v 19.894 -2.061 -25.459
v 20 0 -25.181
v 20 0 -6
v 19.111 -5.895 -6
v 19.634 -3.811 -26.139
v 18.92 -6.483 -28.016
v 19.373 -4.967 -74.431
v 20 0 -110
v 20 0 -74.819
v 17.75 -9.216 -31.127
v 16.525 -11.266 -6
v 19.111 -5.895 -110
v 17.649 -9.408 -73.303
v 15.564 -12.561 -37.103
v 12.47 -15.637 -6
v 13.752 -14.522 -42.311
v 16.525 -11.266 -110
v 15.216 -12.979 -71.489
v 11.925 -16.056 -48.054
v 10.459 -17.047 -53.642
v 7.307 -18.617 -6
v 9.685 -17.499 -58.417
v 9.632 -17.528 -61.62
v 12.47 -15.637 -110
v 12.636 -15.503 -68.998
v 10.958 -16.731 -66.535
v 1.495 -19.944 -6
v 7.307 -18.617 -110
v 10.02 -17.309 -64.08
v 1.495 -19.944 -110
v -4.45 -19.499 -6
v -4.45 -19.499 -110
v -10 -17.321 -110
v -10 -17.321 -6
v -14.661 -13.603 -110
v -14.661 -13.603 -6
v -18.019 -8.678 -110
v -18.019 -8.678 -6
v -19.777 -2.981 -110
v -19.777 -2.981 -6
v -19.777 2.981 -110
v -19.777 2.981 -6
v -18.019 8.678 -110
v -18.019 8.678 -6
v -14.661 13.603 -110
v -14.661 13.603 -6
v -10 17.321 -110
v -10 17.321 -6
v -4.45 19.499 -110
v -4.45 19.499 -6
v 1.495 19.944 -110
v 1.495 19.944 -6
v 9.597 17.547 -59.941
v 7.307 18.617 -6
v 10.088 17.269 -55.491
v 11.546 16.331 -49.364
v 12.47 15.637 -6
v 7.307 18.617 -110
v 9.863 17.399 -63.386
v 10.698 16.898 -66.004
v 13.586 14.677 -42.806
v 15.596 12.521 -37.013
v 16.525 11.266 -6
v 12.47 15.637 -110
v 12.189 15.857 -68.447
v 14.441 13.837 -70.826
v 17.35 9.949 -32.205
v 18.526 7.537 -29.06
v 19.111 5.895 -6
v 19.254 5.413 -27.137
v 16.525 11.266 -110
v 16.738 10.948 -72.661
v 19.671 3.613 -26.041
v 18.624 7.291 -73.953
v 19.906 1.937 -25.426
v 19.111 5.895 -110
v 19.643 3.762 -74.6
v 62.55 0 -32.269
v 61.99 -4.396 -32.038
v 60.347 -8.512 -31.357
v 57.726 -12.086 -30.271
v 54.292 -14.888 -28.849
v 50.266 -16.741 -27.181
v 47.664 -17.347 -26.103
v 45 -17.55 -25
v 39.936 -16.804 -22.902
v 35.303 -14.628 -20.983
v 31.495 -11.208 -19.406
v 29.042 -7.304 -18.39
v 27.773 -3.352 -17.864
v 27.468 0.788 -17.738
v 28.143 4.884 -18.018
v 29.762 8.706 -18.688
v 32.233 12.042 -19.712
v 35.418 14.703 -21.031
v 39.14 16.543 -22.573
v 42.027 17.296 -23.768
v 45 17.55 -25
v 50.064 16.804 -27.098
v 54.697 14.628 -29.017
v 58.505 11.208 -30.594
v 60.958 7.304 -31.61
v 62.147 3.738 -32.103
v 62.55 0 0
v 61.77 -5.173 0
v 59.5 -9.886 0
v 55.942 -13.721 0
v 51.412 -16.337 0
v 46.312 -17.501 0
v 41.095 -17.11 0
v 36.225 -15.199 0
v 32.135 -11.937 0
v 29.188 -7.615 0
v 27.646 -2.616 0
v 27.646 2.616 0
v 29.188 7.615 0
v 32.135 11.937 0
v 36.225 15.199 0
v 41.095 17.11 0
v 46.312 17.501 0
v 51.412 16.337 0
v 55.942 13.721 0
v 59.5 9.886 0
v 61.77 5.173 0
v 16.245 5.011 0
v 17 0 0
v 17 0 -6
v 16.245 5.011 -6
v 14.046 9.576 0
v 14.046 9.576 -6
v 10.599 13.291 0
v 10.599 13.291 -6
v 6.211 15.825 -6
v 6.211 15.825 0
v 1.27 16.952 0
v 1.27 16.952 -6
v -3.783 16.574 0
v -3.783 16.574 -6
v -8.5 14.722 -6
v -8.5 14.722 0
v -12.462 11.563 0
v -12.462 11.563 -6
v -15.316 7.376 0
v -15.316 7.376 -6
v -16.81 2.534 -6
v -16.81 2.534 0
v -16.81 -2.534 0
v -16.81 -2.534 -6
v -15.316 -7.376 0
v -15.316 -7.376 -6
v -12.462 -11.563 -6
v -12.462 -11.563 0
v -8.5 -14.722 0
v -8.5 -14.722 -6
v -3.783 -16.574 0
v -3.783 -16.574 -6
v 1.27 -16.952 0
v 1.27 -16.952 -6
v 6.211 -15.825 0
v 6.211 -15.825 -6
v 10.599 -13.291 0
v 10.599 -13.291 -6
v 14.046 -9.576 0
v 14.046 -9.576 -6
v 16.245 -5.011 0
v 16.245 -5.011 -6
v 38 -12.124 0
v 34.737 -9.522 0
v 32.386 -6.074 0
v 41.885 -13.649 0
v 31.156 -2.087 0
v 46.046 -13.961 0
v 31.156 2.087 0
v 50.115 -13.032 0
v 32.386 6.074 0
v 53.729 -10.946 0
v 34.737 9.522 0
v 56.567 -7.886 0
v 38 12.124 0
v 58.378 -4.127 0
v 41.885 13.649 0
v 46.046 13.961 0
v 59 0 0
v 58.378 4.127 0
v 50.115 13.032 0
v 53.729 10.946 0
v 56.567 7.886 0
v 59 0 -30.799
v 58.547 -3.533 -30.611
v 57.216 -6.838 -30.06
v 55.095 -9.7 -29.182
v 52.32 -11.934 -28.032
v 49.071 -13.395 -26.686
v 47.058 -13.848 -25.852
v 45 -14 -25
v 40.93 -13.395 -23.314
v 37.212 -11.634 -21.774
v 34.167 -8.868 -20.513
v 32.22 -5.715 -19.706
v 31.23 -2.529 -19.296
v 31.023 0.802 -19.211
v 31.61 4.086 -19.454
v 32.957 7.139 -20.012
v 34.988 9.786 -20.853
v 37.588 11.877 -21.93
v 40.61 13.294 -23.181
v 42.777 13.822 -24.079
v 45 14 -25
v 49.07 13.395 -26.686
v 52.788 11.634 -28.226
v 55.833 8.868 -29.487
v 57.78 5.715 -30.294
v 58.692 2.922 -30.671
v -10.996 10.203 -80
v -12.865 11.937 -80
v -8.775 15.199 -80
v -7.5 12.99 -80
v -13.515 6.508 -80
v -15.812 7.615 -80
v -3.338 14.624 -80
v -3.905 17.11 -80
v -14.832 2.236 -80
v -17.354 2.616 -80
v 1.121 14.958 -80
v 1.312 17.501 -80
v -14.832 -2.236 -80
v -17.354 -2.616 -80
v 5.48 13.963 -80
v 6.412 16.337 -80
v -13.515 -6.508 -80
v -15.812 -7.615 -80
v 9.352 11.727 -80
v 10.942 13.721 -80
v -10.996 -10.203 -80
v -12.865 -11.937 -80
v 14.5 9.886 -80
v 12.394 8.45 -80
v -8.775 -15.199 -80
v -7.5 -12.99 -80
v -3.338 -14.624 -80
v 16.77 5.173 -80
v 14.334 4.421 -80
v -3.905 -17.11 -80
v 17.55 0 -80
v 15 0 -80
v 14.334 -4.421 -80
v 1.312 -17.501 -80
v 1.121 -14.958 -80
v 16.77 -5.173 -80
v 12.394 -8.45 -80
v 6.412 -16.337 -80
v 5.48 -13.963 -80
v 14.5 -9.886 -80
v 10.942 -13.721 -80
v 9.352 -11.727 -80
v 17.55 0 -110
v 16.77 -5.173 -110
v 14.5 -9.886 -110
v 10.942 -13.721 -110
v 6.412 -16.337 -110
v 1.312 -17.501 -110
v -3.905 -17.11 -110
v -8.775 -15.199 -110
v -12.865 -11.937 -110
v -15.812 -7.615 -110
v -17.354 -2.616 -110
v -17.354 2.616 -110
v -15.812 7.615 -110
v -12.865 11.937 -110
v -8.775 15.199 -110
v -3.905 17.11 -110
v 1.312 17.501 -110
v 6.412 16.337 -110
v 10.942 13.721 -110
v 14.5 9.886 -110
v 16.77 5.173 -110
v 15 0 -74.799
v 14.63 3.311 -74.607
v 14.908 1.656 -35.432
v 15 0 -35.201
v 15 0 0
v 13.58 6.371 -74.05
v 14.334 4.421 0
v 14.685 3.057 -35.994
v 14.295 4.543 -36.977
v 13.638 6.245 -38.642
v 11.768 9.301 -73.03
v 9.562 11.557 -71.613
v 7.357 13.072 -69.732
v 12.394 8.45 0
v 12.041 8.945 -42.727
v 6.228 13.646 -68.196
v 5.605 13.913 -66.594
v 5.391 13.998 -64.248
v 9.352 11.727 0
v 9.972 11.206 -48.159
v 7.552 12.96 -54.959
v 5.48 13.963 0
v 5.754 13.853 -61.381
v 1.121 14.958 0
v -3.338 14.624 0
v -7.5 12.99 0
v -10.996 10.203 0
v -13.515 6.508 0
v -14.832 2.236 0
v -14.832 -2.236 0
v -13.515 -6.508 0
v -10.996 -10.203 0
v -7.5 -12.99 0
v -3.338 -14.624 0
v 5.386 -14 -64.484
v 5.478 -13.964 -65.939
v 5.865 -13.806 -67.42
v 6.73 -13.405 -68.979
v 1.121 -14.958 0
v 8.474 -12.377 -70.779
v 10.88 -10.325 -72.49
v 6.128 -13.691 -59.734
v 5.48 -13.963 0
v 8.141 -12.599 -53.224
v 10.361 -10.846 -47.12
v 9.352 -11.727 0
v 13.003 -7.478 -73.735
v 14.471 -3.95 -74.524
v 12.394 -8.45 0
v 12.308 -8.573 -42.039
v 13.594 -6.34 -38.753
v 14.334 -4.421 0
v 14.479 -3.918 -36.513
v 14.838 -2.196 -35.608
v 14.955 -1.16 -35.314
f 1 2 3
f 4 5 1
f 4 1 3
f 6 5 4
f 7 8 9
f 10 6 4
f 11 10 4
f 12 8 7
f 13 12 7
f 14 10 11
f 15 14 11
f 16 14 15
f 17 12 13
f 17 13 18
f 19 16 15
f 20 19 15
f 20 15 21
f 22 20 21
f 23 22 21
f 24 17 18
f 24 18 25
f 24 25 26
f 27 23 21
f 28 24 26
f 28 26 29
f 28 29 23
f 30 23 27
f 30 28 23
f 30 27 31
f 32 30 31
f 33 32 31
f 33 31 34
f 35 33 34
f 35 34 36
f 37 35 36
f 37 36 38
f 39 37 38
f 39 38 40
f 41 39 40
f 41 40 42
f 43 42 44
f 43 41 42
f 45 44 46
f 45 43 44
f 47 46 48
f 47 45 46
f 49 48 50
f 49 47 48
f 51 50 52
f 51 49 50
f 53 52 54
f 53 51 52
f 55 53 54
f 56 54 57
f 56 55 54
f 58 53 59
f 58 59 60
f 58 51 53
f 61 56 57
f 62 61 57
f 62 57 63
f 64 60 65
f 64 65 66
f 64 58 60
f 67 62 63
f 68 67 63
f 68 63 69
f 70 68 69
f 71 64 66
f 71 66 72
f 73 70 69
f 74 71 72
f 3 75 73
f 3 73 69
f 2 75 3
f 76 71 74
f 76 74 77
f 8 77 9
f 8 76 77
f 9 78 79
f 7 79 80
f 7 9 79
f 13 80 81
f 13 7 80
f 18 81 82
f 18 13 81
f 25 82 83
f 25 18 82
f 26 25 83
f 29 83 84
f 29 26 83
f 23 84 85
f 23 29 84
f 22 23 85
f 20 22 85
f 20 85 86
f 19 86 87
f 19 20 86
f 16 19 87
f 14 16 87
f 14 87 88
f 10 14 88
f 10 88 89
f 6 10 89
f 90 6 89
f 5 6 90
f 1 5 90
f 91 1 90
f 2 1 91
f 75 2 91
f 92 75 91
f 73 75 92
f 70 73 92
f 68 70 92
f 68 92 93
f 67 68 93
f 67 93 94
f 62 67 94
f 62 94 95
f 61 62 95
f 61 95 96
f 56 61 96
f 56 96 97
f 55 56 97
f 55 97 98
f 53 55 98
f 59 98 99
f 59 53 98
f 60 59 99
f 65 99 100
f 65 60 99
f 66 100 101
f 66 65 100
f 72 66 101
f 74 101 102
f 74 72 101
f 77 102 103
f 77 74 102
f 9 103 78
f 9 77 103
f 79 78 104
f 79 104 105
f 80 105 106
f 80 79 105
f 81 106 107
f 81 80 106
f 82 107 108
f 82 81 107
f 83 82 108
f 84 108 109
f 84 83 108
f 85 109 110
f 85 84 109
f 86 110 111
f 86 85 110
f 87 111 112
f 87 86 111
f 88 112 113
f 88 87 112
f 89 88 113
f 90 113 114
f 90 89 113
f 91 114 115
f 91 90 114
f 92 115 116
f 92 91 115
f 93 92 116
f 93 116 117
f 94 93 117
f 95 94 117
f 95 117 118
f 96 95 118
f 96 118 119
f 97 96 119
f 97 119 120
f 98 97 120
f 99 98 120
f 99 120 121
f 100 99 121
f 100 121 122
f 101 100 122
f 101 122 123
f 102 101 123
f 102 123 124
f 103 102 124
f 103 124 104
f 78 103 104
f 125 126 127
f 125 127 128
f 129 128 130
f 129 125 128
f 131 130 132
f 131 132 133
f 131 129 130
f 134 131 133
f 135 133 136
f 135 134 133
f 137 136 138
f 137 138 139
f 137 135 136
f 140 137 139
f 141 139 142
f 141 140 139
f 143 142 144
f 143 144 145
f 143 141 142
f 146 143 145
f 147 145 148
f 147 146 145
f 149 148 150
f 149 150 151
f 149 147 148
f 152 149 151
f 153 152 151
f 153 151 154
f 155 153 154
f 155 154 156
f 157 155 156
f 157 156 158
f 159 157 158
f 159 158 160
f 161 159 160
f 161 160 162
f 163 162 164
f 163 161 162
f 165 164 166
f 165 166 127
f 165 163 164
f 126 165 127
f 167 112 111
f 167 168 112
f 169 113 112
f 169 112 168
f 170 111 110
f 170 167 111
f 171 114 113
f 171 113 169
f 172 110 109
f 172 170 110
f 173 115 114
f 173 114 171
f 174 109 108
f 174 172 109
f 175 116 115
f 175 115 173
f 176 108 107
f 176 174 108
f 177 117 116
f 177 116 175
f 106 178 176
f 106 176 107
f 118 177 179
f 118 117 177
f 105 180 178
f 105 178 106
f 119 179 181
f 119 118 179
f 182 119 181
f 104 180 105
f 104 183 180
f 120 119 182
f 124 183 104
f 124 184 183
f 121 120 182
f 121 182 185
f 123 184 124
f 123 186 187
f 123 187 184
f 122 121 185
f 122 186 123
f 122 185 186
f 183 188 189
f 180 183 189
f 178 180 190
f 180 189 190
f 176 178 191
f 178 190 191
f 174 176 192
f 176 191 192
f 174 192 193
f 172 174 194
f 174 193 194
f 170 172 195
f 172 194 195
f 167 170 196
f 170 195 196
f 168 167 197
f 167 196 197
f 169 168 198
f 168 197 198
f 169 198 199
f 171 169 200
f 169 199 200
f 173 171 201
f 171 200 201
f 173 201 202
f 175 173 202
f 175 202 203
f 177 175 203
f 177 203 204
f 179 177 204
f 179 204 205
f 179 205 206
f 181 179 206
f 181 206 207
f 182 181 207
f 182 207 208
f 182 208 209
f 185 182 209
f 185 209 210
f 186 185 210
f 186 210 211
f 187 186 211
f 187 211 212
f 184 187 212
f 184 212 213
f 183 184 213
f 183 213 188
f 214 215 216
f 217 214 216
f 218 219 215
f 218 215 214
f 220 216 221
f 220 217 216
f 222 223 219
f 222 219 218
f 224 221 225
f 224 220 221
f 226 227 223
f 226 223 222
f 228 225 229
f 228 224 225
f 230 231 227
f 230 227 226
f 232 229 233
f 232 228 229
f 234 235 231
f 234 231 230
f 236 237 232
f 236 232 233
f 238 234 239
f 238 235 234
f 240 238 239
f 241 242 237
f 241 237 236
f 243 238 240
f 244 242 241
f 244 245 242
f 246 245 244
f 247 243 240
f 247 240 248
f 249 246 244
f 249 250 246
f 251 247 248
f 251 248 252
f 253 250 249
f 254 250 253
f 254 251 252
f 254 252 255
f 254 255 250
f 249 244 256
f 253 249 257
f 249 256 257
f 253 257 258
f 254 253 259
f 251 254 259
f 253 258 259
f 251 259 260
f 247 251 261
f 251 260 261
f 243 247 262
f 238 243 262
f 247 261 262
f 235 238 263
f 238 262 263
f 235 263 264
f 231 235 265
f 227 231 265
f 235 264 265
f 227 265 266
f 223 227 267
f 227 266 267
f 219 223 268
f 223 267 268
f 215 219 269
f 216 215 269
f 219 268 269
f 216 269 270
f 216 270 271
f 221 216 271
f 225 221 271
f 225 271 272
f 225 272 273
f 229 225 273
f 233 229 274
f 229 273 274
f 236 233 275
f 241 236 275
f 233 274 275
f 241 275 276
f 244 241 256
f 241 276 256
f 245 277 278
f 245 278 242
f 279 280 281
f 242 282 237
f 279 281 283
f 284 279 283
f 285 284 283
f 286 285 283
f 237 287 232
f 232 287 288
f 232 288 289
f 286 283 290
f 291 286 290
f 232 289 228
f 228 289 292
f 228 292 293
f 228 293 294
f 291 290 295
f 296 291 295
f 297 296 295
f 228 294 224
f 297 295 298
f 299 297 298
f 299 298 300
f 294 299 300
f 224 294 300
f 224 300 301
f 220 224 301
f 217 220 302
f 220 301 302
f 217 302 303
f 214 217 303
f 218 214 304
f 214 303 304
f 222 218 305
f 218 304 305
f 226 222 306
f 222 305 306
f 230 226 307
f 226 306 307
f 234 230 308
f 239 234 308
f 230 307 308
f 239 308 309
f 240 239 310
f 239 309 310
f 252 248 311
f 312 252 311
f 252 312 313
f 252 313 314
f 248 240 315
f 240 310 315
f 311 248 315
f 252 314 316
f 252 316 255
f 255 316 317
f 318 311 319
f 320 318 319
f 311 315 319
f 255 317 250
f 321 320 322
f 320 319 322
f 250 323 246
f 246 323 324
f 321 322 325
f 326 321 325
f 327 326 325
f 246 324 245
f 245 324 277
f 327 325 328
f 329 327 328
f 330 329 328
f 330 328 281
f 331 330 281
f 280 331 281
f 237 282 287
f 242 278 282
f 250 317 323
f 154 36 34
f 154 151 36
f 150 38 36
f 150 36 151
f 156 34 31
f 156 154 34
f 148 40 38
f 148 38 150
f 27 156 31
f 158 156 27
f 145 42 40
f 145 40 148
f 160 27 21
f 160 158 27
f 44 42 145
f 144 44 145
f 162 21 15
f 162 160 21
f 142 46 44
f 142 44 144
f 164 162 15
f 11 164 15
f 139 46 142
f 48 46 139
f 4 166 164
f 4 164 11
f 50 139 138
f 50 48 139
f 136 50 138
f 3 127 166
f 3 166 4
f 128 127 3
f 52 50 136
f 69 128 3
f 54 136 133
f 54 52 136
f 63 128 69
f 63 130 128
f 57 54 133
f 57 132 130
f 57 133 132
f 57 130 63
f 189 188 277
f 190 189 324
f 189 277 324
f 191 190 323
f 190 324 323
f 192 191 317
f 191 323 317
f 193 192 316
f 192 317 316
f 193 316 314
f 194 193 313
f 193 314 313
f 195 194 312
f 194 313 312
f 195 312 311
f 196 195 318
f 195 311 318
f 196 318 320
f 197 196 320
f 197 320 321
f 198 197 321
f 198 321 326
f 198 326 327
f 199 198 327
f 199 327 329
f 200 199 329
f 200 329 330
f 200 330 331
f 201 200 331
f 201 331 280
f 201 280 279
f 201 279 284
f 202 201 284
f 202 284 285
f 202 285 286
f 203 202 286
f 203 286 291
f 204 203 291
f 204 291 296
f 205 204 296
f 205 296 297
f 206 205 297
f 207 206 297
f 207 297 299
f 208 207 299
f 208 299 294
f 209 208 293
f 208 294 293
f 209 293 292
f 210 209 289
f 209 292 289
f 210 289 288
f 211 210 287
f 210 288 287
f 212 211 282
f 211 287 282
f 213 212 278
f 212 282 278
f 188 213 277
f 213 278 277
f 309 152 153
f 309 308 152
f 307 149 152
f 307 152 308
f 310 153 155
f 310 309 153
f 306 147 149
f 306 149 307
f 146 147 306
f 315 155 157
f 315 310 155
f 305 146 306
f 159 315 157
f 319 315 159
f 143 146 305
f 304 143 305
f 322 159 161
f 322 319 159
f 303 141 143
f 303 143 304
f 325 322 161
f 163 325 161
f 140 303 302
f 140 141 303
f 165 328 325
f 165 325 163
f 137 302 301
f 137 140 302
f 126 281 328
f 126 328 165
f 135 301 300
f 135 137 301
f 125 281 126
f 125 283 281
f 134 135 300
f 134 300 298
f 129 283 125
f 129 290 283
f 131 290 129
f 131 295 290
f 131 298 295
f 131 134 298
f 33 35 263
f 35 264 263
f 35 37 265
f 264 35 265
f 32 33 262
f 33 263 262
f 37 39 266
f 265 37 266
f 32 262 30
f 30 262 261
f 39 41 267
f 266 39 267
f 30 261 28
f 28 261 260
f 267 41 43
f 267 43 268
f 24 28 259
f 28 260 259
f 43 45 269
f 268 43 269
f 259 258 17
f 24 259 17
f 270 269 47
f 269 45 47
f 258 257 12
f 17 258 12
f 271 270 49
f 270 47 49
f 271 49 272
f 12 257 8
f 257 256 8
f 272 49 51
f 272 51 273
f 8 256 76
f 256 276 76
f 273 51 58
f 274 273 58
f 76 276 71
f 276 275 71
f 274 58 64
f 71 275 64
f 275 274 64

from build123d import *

# Parameters (mm, degrees)
F1_R     = 20
F1_R_2   = 17.55
F4_R     = 17.55
F5_DEPTH = 30
F6_R     = 15
F7_DEPTH = 110.0010001
F8_R     = 20
F8_R_2   = 17
F9_DEPTH = 6
F10_R    = 14


with BuildPart() as f2:
    # F2: sweep along a path in F0
    with BuildLine(Plane.XZ) as f2_path:
        Line((0, 0), (0, -70))
        Line((0, -70), (0, -110))
    # F1 (on Top) → F2 (sweep)
    with BuildSketch(Plane.XY):
        Circle(F1_R)
    sweep(path=f2_path.line)

    # F3: sweep along a path in F0
    with BuildLine(Plane.XZ) as f3_path:
        Line((45, 0), (45, -25))
        Line((45, -25), (0, -70))
    # F1 (on Top) → F3 (sweep)
    with BuildSketch(Plane.XY):
        with Locations((45, 0)):
            Circle(F1_R_2)
    sweep(path=f3_path.line, transition=Transition.RIGHT)

    # F4 (on face) → F5 (cut)
    with BuildSketch(Plane(origin=(0, 0, -110), x_dir=(1, 0, 0), z_dir=(0, 0, -1))):
        Circle(F4_R)
    extrude(amount=-F5_DEPTH, mode=Mode.SUBTRACT)

    # F6 (on face) → F7 (cut, through all)
    with BuildSketch(Plane.XY):
        Circle(F6_R)
    extrude(amount=-F7_DEPTH, mode=Mode.SUBTRACT)

    # F8 (on face) → F9 (cut)
    with BuildSketch(Plane.XY):
        Circle(F8_R)
        Circle(F8_R_2, mode=Mode.SUBTRACT)
    extrude(amount=-F9_DEPTH, mode=Mode.SUBTRACT)

    # F11: sweep along a path in F0
    with BuildLine(Plane.XZ) as f11_path:
        Line((45, 0), (45, -25))
        Line((45, -25), (0, -70))
    # F10 (on face) → F11 (sweep, cut)
    with BuildSketch(Plane.XY):
        with Locations((45, 0)):
            Circle(F10_R)
    sweep(path=f11_path.line, transition=Transition.RIGHT, mode=Mode.SUBTRACT)


solid = f2.part
